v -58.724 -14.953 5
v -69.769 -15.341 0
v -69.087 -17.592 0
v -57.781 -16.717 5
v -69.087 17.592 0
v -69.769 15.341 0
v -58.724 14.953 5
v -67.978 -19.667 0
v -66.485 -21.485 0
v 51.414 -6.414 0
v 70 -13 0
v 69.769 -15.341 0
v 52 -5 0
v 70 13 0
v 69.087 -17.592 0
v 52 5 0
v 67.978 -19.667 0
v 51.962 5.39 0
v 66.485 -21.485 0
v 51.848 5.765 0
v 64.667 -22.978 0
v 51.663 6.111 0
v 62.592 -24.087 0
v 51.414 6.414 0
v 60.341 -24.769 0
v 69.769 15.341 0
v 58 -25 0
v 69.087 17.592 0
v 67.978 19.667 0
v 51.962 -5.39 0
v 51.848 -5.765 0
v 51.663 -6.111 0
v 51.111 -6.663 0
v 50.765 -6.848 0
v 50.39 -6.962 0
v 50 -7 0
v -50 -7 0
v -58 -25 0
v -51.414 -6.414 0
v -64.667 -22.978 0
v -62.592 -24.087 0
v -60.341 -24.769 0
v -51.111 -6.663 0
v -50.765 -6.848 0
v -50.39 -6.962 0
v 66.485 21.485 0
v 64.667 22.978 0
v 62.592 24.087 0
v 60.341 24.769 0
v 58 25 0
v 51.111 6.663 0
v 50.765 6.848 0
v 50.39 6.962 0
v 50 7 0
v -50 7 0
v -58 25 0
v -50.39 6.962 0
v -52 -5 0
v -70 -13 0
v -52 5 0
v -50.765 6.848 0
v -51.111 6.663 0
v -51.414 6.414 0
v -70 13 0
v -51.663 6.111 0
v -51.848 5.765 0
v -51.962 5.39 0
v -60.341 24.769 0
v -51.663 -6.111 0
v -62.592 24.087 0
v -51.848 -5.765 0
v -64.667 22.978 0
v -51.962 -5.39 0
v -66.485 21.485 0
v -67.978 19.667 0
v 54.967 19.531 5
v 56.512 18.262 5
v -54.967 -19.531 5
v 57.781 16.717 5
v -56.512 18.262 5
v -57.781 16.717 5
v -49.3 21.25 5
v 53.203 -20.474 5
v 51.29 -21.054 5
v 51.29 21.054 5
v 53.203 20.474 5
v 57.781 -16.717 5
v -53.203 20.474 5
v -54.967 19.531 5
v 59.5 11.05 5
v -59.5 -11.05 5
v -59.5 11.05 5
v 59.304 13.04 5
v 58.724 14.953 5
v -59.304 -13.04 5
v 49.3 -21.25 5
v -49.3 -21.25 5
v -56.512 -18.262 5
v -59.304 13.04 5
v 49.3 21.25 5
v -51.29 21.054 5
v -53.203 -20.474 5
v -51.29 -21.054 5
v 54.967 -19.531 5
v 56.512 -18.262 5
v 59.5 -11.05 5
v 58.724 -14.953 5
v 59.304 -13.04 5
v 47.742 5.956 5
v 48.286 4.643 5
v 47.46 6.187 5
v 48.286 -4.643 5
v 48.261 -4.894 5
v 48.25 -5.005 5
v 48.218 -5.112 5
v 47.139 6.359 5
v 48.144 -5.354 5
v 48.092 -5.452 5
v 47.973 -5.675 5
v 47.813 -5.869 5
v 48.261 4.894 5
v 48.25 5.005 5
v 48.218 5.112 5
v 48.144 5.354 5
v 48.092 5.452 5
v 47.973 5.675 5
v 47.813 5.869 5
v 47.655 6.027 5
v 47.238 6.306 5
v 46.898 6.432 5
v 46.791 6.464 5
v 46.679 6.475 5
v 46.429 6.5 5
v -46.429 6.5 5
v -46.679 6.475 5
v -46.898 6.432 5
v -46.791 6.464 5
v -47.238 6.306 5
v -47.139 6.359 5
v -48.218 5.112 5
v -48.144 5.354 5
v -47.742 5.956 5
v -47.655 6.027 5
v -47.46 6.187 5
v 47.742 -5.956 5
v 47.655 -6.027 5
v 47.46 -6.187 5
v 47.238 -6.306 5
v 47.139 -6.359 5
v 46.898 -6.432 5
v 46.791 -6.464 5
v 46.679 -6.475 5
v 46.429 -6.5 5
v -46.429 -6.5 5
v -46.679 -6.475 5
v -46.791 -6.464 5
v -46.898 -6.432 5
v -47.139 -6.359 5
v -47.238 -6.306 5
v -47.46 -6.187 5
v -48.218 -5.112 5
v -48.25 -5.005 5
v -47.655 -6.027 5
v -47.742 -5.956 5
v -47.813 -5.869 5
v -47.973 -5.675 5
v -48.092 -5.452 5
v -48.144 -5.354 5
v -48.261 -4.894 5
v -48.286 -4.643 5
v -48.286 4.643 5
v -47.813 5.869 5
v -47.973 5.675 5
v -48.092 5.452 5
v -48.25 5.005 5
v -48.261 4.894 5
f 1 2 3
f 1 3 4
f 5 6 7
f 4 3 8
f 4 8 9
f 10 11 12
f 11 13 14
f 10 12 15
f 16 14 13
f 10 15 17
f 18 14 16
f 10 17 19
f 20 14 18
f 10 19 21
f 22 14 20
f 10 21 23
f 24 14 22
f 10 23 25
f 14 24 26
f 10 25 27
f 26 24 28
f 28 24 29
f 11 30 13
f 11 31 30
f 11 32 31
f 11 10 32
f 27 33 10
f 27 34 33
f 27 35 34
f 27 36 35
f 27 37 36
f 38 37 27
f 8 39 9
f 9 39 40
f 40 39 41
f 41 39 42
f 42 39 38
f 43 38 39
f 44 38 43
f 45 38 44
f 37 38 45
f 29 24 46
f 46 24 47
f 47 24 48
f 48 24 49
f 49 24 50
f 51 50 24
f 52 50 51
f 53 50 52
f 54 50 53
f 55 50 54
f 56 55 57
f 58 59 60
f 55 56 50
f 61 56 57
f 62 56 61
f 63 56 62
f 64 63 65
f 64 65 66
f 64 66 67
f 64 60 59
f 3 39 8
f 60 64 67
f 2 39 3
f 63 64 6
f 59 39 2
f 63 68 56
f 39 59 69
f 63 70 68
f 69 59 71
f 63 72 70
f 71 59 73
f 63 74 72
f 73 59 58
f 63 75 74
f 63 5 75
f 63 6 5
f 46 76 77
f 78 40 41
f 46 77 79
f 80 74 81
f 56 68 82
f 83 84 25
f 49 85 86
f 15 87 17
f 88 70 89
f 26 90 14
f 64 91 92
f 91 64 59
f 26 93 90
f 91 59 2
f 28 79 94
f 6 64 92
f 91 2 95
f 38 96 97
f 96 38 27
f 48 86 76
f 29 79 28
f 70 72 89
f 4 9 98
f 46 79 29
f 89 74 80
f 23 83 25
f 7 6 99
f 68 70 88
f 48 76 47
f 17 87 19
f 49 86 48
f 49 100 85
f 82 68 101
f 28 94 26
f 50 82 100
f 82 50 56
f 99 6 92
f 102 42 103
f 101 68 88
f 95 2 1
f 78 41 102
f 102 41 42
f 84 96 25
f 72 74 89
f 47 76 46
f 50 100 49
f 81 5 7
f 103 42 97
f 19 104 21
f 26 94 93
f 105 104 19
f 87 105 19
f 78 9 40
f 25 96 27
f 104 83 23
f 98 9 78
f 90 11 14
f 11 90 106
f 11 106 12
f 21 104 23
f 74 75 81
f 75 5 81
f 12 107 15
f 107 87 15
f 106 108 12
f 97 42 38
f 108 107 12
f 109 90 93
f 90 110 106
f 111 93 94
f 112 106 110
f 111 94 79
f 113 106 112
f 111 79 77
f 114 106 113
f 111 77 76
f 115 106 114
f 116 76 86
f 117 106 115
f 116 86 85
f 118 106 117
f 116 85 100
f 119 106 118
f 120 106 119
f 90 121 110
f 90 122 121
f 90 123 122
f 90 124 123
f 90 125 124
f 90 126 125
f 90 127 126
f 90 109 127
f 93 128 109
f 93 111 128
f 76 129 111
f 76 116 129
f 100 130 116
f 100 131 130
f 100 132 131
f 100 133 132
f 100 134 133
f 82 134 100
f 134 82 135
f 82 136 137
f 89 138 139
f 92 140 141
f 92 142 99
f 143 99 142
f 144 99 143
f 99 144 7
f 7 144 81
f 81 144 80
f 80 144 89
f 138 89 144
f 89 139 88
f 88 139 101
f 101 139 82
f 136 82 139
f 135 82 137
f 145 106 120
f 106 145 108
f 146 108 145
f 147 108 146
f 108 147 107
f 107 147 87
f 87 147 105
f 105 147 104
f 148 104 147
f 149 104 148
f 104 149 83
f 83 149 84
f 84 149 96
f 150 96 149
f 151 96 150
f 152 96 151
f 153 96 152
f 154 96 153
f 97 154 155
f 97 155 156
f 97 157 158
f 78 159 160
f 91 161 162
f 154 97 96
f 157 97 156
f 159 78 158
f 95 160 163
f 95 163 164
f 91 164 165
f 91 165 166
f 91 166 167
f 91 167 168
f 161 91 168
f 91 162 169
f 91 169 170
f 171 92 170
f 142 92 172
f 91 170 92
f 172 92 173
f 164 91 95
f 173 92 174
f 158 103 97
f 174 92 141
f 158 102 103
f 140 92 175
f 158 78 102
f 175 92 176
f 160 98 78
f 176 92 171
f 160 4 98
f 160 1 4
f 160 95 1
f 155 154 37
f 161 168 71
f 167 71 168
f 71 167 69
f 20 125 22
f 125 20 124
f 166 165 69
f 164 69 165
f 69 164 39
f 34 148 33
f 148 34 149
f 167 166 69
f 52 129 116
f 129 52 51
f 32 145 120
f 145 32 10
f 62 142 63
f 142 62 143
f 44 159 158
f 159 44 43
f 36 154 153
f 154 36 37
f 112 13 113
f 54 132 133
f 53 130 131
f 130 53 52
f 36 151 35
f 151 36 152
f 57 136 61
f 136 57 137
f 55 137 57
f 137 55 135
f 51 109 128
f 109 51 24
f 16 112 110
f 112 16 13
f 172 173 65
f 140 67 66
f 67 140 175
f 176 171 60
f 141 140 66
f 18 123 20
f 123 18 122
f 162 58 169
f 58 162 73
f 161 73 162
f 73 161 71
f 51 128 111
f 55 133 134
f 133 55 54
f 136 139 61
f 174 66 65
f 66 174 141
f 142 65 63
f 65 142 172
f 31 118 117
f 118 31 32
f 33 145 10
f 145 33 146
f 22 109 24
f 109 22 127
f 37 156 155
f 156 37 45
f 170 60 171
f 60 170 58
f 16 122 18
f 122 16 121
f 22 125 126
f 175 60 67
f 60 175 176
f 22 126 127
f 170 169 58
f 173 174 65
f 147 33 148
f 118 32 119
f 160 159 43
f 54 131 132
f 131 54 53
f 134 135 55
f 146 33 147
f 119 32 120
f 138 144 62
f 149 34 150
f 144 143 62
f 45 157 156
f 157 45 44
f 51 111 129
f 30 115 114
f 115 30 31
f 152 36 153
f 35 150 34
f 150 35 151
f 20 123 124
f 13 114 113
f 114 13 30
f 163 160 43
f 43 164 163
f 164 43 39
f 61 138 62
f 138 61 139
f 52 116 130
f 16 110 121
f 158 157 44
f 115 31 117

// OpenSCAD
$fn = 32;

// ----------------------------------------------------------------------
// Display bezel: 140 x 50 mm frame, opening 104x14 mm
// ----------------------------------------------------------------------

// --- parameters (mm) ---
length = 140;             // frame outside length, X
width = 50;               // frame outside width, Y
frame_w = 18;             // frame width
thickness = 5;            // frame thickness
corner_r = 12;            // outside corner radius
chamfer = 0.85;           // outer wall taper
funnel = 0.9;             // inner opening taper
opening_l = 104;          // opening length
opening_w = 14;           // opening width
inner_r = 2;              // opening corner radius

/* rounded-rectangle outlines, generated with loops */
module rounded_ring(l_nom, w_nom, r) {
  hull() {
    for (sx = [-1, 1]) for (sy = [-1, 1])
      translate([sx * (l_nom / 2 - r), sy * (w_nom / 2 - r)]) circle(r = r);
  }
}

difference() {
  /* frame body, drafted so the outer edge is a variable-depth chamfer */
  linear_extrude(height = thickness, scale = chamfer)
    rounded_ring(length, width, corner_r);
  /* viewing opening, drafted the other way for a funnel edge */
  linear_extrude(height = thickness + 2, scale = funnel)
    translate([0, 0, -1]) rounded_ring(opening_l, opening_w, inner_r);
}
